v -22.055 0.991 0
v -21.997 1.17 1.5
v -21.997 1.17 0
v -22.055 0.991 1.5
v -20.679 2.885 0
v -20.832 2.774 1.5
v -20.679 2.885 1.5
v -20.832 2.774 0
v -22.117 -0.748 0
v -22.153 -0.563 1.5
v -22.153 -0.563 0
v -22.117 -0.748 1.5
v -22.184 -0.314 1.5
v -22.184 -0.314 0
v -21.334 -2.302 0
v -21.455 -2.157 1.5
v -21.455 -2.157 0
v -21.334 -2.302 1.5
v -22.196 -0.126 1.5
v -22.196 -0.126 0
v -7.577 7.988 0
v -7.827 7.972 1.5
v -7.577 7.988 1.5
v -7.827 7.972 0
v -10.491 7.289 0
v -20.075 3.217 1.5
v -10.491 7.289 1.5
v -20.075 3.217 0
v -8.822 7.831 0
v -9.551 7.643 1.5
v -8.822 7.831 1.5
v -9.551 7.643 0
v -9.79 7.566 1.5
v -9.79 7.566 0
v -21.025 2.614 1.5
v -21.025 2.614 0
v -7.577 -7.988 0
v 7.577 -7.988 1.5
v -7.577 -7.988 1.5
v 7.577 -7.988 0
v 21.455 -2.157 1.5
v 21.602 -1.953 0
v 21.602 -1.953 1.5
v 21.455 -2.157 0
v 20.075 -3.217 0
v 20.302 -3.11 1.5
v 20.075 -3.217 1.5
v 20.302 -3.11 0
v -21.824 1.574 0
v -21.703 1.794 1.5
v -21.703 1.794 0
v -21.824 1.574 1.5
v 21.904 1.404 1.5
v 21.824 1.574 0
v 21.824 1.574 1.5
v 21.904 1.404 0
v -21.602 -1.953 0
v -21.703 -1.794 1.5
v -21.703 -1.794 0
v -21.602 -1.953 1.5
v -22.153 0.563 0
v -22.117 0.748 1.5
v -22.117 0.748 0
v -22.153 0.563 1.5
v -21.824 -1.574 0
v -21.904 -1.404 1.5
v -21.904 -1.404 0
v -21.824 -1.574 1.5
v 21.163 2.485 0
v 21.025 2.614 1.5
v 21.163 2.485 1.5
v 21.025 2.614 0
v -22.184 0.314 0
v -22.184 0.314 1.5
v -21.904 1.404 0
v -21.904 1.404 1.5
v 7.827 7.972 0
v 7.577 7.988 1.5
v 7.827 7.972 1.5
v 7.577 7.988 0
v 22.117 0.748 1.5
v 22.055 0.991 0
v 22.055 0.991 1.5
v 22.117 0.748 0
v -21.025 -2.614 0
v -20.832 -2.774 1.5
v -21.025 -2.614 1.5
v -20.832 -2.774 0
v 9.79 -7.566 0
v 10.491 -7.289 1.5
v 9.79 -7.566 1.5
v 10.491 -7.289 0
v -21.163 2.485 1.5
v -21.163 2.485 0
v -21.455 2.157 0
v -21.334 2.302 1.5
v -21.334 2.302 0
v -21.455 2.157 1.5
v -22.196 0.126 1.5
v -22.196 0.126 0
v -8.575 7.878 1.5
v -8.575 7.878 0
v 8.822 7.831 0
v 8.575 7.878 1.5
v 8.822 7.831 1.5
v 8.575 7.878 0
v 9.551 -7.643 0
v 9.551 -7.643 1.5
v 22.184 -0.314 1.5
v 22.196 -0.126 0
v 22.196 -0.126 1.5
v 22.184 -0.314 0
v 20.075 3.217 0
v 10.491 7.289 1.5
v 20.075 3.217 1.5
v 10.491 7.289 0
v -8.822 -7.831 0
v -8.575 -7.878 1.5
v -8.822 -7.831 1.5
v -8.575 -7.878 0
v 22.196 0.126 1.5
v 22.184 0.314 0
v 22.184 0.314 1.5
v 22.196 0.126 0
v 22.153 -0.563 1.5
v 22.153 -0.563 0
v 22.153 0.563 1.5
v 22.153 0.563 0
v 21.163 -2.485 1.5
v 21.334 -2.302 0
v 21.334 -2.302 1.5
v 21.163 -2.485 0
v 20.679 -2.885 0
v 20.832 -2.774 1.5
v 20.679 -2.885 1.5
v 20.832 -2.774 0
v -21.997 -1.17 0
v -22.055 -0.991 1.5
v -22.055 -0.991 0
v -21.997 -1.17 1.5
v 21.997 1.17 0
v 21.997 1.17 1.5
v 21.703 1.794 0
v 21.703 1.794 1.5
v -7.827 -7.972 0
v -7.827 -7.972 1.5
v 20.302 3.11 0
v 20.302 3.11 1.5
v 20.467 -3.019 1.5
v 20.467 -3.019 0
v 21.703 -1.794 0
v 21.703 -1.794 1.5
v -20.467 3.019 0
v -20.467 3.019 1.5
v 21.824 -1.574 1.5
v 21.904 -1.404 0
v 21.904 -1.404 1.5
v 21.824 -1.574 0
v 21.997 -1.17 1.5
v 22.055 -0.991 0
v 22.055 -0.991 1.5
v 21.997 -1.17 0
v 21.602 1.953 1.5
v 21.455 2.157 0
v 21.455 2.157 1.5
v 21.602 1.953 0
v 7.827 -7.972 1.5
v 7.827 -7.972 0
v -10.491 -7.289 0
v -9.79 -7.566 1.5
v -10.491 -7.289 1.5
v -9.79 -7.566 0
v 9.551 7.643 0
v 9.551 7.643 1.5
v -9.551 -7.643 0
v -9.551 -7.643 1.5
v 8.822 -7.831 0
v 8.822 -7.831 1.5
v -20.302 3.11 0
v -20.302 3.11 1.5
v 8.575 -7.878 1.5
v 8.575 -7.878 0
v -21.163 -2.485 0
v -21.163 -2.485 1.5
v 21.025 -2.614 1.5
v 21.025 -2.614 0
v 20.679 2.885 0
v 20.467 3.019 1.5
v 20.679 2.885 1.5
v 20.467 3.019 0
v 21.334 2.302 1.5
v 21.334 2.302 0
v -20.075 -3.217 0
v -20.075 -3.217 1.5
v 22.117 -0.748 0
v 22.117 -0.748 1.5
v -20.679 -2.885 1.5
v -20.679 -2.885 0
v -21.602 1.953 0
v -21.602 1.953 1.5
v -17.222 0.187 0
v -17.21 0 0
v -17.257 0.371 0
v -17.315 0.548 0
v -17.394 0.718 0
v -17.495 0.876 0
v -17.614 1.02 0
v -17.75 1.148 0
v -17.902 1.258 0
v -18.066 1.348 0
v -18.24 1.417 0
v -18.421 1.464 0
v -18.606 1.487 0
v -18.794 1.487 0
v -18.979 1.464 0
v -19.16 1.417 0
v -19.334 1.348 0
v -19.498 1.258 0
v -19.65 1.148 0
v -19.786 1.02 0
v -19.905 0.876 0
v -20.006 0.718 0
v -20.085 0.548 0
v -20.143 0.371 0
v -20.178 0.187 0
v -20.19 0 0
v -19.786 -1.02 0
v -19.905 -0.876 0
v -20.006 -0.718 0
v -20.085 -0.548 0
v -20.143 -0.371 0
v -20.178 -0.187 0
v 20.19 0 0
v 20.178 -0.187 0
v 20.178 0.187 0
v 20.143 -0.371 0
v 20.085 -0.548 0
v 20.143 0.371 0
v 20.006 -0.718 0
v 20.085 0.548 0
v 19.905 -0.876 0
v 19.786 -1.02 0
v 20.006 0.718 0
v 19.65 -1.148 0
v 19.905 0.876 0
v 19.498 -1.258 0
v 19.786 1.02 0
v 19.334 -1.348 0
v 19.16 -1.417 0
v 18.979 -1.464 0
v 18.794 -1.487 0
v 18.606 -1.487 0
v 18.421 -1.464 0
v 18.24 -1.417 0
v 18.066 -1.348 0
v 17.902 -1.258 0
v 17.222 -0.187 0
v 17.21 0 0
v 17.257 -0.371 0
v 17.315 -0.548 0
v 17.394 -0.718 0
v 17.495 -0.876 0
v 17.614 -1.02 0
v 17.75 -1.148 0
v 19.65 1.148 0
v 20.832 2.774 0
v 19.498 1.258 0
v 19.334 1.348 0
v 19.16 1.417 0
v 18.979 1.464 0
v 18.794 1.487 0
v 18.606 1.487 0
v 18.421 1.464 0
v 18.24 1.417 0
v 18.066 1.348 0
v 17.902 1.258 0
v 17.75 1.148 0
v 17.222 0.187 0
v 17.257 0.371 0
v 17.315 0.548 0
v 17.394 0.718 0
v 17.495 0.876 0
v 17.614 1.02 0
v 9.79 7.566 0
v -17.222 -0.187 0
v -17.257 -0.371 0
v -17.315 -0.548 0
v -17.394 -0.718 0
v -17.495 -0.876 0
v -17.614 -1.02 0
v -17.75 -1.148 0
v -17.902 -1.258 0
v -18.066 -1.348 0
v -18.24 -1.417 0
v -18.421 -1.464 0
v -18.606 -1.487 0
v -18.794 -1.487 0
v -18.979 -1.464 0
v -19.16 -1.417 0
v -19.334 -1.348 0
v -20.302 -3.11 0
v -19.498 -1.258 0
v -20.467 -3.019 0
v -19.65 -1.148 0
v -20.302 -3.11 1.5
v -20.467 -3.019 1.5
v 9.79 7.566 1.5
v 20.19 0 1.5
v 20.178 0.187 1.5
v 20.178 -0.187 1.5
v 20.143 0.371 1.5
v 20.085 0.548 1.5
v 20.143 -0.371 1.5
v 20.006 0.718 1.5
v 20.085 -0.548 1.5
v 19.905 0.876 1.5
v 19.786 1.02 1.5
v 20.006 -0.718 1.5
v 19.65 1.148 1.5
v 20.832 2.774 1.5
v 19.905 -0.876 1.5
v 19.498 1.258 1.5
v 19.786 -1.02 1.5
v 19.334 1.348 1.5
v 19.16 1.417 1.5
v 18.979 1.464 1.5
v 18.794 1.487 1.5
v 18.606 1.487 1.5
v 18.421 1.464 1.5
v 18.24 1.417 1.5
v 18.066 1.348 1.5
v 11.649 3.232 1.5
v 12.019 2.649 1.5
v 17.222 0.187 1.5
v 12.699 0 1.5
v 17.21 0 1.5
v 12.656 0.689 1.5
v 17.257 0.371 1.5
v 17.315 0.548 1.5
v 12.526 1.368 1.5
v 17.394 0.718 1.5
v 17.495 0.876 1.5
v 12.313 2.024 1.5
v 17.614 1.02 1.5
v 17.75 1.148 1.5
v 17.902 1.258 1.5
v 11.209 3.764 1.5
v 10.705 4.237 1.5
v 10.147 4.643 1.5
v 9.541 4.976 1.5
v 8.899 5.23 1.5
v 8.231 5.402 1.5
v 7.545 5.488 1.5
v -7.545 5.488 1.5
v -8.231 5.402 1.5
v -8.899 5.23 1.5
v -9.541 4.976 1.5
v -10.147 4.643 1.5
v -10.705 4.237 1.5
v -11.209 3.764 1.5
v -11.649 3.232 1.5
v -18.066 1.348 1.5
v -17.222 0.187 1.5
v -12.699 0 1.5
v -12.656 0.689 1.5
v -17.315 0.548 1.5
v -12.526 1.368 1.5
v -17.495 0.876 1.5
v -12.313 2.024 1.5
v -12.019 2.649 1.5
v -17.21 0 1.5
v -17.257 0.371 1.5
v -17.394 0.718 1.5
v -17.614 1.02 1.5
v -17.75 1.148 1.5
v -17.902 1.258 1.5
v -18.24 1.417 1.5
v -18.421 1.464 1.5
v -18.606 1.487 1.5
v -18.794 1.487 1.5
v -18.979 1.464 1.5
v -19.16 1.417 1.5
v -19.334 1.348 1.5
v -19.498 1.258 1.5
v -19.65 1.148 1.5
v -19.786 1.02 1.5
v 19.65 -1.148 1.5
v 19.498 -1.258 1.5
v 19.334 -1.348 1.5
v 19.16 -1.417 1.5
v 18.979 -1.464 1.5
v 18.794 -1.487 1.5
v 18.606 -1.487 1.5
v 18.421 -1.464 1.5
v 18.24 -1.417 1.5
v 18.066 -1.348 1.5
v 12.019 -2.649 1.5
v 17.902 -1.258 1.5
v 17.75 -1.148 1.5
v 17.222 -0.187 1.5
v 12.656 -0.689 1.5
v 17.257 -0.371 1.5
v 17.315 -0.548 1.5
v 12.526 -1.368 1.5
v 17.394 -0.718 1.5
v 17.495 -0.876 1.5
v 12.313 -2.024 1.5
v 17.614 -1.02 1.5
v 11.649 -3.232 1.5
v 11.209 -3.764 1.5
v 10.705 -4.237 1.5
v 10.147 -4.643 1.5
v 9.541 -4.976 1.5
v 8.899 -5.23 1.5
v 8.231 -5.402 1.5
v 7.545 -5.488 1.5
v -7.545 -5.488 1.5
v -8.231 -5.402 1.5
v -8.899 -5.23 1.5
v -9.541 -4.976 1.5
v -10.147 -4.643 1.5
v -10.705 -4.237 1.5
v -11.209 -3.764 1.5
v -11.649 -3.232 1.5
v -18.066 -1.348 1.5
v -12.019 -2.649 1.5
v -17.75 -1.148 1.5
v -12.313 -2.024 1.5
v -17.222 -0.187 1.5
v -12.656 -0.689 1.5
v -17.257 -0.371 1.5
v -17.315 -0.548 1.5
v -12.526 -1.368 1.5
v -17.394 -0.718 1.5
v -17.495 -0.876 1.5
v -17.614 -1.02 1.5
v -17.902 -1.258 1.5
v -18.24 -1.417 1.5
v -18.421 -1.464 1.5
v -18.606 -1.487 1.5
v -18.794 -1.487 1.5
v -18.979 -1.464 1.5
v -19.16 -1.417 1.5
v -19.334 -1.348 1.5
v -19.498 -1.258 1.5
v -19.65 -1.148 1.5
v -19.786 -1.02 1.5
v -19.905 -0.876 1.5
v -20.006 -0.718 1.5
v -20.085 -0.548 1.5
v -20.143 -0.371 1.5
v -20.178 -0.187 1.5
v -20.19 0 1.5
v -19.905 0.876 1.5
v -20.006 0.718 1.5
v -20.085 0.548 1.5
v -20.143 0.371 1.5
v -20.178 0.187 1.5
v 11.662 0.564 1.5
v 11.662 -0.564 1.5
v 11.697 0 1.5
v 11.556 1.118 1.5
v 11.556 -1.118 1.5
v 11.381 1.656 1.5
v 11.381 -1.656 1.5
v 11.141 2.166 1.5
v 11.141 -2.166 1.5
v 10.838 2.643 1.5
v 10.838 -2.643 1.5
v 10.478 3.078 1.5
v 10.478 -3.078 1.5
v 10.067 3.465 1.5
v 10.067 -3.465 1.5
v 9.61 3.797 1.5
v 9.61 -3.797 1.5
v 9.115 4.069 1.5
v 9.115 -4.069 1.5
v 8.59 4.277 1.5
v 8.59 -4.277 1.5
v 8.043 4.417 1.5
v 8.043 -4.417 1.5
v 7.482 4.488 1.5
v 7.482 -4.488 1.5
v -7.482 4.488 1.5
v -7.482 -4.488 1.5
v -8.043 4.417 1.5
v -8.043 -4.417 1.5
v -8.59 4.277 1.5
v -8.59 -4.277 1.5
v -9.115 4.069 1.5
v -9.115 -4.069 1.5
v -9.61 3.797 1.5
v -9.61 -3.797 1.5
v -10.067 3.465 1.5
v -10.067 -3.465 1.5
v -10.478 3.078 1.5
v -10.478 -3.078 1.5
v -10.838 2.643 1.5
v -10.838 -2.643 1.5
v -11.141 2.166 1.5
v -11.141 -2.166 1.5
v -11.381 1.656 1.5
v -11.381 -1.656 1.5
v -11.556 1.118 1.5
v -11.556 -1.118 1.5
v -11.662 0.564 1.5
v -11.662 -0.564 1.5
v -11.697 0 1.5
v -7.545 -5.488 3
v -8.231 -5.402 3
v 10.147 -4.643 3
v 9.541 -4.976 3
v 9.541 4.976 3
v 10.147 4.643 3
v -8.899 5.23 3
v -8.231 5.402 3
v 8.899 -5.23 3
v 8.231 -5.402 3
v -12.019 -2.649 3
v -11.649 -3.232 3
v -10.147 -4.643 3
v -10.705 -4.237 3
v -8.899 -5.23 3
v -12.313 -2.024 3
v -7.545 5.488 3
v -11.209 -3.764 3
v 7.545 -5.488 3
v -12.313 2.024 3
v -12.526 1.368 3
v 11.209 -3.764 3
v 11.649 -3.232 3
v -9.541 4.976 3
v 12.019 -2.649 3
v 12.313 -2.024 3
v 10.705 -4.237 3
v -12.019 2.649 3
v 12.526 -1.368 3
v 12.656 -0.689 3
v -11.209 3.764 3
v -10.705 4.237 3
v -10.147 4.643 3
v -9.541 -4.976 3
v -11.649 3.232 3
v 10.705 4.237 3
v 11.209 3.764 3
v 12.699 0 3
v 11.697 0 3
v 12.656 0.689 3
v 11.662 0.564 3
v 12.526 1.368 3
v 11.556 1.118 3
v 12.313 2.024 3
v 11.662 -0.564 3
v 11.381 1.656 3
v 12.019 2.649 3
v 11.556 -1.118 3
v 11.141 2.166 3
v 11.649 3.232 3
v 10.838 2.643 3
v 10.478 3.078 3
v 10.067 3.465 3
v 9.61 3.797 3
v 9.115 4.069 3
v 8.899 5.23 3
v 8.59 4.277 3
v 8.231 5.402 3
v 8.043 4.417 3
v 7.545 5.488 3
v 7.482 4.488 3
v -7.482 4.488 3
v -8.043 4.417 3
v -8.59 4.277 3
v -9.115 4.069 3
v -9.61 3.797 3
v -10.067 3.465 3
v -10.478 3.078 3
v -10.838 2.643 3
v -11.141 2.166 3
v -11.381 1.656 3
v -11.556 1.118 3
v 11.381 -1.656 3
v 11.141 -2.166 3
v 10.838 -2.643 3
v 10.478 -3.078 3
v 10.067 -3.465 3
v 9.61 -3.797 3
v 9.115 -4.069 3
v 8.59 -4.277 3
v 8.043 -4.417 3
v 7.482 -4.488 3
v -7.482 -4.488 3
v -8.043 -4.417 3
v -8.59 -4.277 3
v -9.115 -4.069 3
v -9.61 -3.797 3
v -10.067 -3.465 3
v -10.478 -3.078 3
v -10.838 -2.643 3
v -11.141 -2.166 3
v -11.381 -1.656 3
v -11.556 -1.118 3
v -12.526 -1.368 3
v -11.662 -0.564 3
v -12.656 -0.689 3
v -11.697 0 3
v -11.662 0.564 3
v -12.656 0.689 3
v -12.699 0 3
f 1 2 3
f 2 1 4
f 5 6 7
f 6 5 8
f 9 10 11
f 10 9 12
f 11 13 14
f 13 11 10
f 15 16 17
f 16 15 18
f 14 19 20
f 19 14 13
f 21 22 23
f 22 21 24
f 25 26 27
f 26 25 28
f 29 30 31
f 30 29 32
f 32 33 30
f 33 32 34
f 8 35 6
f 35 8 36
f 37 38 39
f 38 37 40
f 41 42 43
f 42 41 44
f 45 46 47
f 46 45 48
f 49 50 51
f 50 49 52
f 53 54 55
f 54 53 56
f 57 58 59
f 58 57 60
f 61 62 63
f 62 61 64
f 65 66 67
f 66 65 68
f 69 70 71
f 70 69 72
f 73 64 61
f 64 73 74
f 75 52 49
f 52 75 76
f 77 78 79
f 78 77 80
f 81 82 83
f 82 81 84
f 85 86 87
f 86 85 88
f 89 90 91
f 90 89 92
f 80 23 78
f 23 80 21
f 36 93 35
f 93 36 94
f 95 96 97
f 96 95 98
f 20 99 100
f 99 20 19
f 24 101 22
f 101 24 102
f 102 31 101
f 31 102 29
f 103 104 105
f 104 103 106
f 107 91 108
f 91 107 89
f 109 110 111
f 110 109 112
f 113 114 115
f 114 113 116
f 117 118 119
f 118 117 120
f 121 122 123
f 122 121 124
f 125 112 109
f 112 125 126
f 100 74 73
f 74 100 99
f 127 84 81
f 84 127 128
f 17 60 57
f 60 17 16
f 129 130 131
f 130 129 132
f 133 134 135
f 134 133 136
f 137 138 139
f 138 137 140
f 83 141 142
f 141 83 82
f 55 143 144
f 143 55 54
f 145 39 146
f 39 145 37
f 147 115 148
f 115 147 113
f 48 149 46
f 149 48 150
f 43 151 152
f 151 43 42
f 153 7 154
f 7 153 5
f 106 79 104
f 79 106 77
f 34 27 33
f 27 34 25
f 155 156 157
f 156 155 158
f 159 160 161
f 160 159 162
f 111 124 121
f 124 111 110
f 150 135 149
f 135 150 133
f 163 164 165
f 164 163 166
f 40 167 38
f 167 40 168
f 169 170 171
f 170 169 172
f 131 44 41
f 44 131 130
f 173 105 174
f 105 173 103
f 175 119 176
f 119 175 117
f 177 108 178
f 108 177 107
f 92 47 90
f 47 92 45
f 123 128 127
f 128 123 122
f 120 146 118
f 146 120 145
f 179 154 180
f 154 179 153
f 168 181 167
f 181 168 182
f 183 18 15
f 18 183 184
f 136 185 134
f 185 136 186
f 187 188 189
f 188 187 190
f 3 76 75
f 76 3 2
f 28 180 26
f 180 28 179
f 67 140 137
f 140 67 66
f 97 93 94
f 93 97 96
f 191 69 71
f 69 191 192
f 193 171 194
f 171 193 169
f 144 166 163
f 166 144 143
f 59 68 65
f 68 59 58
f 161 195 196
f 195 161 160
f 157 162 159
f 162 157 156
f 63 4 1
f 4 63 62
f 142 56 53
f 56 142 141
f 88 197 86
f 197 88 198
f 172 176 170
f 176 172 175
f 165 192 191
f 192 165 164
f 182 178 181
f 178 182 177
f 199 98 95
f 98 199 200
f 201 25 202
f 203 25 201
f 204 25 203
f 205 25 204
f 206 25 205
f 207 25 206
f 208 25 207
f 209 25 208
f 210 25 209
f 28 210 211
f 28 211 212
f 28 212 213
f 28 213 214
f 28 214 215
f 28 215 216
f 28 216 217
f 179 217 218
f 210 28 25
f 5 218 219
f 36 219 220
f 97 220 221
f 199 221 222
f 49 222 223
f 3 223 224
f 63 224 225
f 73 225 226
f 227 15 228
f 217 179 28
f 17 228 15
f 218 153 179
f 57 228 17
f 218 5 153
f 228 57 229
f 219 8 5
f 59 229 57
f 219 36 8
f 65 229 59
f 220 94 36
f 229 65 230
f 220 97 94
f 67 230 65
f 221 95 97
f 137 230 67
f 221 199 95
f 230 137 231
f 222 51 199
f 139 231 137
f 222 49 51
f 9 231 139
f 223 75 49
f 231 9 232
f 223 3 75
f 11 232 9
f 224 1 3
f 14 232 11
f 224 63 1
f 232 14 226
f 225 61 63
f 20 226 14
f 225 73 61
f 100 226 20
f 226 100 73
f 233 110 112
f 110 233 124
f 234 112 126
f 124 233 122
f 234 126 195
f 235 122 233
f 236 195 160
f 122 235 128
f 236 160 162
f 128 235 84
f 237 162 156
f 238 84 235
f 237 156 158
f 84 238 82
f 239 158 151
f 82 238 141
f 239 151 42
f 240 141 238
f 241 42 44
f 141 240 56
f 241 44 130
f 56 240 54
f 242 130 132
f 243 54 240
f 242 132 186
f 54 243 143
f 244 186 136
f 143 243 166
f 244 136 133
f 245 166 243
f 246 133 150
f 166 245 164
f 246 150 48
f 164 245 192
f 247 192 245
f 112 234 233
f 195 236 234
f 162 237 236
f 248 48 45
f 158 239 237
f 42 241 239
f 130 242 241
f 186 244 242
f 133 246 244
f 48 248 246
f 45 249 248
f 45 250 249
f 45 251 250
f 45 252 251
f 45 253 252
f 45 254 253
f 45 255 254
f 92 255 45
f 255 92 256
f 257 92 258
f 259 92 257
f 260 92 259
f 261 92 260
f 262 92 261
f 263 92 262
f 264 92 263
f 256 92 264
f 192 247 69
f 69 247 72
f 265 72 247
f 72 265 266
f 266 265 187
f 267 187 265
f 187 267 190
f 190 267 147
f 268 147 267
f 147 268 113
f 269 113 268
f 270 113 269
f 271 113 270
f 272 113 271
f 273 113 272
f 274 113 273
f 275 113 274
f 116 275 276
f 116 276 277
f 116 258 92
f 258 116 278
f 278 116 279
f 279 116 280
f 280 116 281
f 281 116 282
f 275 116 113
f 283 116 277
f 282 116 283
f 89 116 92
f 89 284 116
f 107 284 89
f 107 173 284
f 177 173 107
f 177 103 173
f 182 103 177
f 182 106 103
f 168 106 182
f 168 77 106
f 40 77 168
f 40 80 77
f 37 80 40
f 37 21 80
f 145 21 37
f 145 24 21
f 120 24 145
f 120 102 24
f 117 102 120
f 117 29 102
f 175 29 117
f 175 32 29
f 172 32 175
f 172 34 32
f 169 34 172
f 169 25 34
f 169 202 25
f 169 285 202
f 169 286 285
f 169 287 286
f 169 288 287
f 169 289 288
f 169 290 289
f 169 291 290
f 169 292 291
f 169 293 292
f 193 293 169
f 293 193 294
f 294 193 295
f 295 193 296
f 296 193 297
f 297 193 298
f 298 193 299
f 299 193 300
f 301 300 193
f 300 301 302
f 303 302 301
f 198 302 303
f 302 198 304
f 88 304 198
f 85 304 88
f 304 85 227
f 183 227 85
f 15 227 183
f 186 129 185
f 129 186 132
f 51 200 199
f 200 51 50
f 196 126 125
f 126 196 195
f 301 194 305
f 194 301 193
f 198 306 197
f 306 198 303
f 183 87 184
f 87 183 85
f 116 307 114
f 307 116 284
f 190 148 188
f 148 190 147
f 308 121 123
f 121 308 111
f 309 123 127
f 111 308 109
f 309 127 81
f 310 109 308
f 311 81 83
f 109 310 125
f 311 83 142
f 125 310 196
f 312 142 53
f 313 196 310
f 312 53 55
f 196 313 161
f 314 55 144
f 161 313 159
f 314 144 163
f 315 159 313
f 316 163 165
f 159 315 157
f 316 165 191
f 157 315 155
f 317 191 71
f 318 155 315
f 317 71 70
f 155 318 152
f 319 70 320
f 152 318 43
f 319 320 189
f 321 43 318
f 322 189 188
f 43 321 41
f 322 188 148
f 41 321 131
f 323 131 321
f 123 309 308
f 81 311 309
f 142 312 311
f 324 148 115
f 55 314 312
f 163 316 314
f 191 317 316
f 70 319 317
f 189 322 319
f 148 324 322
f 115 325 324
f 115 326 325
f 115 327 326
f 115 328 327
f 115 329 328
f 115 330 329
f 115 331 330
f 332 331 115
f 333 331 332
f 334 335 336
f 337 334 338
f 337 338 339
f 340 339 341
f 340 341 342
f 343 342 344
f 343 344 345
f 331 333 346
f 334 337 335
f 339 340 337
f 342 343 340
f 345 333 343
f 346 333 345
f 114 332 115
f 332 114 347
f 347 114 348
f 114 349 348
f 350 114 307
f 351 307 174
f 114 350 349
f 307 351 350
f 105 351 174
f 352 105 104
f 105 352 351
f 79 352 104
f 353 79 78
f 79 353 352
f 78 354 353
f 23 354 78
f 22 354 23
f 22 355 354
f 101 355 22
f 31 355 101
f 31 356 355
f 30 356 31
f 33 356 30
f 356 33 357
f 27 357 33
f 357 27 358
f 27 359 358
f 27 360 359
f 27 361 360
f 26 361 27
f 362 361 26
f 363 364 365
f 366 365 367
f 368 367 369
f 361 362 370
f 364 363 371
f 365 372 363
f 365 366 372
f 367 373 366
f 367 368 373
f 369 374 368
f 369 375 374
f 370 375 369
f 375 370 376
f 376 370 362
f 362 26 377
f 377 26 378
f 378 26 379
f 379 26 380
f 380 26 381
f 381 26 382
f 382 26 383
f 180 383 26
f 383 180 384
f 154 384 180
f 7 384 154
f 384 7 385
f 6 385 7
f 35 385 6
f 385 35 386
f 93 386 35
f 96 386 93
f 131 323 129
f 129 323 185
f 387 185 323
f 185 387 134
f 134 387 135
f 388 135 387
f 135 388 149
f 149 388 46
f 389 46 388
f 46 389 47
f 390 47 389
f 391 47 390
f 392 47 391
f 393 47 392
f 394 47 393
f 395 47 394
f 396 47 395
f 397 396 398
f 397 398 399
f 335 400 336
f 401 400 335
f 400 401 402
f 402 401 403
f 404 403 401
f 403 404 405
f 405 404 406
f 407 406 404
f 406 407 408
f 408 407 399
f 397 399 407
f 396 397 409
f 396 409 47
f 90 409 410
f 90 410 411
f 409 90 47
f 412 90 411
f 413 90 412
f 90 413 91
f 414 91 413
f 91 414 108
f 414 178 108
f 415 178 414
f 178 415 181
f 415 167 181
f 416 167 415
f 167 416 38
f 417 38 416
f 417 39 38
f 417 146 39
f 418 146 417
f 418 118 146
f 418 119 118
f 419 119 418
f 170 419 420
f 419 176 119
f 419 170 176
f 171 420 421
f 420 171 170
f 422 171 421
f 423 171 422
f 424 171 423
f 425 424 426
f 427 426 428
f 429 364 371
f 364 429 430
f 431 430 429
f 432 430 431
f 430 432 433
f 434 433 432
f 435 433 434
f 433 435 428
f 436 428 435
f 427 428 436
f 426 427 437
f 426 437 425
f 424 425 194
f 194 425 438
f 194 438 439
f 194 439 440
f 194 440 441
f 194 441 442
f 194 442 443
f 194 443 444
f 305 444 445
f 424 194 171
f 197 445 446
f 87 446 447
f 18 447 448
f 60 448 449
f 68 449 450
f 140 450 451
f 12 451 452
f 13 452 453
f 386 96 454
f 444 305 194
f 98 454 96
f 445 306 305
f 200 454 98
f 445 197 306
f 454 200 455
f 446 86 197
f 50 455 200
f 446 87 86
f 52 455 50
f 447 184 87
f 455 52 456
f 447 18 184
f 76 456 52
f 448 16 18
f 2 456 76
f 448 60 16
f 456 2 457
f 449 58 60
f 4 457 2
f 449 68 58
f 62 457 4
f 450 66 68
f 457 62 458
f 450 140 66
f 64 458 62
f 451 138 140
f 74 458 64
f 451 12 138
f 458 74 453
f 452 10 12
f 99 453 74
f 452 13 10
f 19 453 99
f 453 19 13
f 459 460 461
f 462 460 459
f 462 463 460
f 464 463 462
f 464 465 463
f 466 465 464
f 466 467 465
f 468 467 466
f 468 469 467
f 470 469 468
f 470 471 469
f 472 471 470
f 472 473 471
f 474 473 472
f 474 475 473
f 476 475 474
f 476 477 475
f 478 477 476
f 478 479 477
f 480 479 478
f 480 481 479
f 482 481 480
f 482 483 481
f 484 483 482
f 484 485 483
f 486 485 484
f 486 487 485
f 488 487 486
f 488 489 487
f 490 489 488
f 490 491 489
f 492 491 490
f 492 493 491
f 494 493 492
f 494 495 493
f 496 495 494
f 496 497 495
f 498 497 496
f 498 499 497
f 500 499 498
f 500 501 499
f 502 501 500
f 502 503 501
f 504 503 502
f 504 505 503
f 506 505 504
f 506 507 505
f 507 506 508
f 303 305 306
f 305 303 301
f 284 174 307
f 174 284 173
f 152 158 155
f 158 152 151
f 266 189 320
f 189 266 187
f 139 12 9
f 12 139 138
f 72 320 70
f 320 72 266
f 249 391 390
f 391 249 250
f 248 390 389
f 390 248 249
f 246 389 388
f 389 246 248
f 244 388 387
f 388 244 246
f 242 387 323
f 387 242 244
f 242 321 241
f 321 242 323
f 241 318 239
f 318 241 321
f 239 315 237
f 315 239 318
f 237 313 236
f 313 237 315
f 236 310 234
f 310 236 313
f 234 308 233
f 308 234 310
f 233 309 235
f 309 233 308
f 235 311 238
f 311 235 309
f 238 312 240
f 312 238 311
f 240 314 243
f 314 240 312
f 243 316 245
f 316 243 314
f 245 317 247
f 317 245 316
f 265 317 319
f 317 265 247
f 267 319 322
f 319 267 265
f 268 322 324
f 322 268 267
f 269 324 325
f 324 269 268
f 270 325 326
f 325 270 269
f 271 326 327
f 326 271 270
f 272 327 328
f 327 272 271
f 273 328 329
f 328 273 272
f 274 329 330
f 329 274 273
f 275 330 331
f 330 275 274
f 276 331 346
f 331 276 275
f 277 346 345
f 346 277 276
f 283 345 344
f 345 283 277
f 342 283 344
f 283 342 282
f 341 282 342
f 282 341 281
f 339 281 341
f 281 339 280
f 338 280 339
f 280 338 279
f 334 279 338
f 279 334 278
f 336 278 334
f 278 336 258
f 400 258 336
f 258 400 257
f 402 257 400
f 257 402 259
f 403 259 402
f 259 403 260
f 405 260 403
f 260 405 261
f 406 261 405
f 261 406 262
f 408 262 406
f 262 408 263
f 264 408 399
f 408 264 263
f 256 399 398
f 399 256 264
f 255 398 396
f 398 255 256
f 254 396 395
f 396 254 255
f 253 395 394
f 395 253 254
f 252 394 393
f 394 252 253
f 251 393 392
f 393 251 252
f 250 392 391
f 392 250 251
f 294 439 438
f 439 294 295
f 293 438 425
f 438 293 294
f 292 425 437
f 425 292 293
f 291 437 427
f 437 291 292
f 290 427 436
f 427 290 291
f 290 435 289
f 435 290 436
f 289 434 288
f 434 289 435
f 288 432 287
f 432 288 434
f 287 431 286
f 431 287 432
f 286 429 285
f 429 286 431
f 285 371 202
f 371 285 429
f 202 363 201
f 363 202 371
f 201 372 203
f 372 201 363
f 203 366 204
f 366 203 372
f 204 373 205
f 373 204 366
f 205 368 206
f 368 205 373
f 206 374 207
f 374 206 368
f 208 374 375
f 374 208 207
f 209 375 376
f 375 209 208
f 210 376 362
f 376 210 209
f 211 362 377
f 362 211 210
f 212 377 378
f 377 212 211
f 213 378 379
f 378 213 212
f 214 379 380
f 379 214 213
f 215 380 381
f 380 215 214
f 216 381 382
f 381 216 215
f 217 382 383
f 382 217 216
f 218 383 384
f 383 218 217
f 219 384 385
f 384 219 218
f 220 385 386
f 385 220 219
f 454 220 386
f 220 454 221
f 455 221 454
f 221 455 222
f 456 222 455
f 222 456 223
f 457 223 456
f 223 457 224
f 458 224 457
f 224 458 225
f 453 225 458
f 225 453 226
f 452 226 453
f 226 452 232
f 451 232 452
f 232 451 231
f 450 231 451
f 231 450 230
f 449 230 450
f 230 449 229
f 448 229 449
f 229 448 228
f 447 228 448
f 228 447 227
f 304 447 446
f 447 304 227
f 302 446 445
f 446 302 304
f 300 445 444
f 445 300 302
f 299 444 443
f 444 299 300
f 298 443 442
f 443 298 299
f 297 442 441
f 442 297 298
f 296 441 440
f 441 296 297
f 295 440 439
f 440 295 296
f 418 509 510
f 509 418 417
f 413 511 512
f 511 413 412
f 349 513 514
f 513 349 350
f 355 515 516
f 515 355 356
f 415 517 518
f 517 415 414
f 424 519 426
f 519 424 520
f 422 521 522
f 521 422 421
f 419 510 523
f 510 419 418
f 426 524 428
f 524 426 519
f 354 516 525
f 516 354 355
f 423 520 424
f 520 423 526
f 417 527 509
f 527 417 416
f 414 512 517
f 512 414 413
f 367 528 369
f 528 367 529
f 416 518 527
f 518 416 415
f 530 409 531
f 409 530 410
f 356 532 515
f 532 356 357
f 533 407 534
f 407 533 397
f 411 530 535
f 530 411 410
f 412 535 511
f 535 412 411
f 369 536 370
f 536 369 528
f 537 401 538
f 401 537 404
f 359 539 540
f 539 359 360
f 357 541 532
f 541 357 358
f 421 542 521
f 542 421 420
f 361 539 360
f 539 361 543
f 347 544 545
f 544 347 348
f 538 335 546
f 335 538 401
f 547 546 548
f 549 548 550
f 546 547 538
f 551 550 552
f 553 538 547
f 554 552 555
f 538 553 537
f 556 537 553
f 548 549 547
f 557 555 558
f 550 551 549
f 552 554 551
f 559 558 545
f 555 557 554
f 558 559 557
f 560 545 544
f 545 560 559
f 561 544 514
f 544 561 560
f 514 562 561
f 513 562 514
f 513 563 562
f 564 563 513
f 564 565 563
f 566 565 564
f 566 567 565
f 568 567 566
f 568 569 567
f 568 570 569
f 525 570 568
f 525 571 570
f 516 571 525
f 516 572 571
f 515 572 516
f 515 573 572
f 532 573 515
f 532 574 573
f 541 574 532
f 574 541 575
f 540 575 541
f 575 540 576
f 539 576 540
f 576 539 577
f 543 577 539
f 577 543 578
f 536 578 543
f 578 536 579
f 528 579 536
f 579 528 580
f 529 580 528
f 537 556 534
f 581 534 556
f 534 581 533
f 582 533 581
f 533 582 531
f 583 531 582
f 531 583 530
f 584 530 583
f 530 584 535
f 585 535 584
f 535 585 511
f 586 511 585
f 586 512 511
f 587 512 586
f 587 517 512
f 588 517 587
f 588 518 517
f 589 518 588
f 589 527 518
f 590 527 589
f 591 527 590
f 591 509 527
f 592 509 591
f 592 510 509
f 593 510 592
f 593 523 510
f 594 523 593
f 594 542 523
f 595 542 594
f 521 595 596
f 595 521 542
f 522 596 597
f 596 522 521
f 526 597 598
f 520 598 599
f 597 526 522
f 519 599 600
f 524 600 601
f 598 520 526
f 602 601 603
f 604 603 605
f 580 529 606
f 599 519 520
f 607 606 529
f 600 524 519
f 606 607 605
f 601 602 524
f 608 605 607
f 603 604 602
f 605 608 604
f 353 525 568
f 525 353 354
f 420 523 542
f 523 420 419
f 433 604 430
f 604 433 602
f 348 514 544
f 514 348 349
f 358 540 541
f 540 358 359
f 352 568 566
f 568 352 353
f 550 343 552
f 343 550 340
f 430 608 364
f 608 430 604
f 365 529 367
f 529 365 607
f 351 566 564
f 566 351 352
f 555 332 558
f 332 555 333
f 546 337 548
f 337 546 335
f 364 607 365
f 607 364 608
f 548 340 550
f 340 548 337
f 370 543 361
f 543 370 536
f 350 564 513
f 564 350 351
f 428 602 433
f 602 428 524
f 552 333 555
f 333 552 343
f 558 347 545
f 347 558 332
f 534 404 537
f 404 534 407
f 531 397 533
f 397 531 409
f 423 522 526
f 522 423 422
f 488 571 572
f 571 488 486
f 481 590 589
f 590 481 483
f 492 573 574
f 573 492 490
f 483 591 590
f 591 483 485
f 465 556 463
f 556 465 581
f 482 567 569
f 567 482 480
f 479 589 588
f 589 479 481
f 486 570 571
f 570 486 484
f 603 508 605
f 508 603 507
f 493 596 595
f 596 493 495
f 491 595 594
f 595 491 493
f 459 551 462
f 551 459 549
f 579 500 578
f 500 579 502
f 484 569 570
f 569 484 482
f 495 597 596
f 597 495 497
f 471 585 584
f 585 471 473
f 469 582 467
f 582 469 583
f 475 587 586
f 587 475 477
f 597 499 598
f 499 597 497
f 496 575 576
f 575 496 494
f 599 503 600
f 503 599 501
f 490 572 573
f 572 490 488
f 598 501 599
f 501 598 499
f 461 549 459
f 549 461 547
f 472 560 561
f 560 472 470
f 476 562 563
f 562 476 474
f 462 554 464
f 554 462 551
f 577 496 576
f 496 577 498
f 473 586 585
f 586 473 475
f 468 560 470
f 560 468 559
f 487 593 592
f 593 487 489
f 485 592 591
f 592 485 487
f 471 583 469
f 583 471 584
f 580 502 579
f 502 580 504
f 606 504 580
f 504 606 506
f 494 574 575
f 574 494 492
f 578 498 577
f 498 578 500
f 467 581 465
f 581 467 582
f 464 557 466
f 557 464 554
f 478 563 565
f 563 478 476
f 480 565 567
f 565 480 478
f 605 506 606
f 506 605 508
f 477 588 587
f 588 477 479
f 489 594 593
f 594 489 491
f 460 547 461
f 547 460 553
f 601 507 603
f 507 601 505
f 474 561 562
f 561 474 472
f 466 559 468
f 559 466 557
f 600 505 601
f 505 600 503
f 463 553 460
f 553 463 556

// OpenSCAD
// file: common.scad
module __fillet(r) {
   offset(r = +r) {
     offset(delta = -r) {
       children();
     }
   }
}

module __chamfer_corners(r) {
    offset(r = +r) {
        offset(delta = -r) {
            children();
        }
    }
}

module __apply_border(size) {
    translate([size, size]) {
        offset(delta = size) {
            children();
        }
    }
}
// file: box.scad
include <config.scad>
include <common.scad>


module __box_outline(size) {
    size = size == undef ? box_size : size;
    __fillet(r=fillet_radius) {
         square([size.x, size.y]);
    }
}


module __bolt_holes_outline(d, size) {
    size = size == undef ? box_size : size;
    translate([screw_post_inset, screw_post_inset]) {
        circle(d = d);
    }
    translate([size.x - screw_post_inset, screw_post_inset]) {
        circle(d = d);
    }
    translate([size.x - screw_post_inset, size.y - screw_post_inset]) {
        circle(d = d);
    }
    translate([screw_post_inset, size.y - screw_post_inset]) {
        circle(d = d);
    }
}


module __vacuum_hole_outline() {
    spacing = vacuum_hole_diameter * 0.6;

    hull() {
        translate([-spacing, 0, 0]) {
            circle(d = vacuum_hole_diameter);
        }
        translate([spacing, 0, 0]) {
            circle(d = vacuum_hole_diameter);
        }
    }

    screw_spacing = spacing + vacuum_hole_diameter / 2 + bolt_head_clearance / 2 + 2;

    translate([screw_spacing, 0, 0]) {
        circle(d = bolt_diameter);
    }
    translate([-screw_spacing, 0, 0]) {
        circle(d = bolt_diameter);
    }
}

module __vacuum_hole() {
    translate([box_size.x / 2, 0, box_size.z / 2]) {
        rotate([90, 0, 0]) {
            linear_extrude(wall_thickness * 2 + 0.04, center=true) {
                __vacuum_hole_outline();
            }
        }
    }
}

module __vacuum_holes() {
    __vacuum_hole();
    translate([0, box_size.y]) __vacuum_hole();
    rotate([0, 0, 90]) __vacuum_hole();
    translate([box_size.x, 0]) rotate([0, 0, 90]) __vacuum_hole();
}

module box() {
    color("MediumPurple") {
        difference() {
            union() {
                difference() {
                    // Box
                    linear_extrude(box_size.z) {
                        __box_outline();
                    }
                    // Inner void
                    translate([0, 0, floor_thickness]) {
                        linear_extrude(box_size.z) {
                            offset(r = -wall_thickness) {
                                __box_outline();
                            }
                        }
                    }
                    // Vacuum holes
                    __vacuum_holes();
                }

                // Screw posts
                linear_extrude(box_size.z) {
                    __bolt_holes_outline(screw_post_diameter);
                }
            }

            // Screw holes
            translate([0, 0, -0.02]) {
                linear_extrude(box_size.z + 0.04) {
                    difference() {
                        __bolt_holes_outline(bolt_diameter);
                    }
                }
                linear_extrude(nut_height) {
                    difference() {
                        __bolt_holes_outline(nut_diameter);
                    }
                }
            }
        }
    }
}

box();
// file: config.scad
$fn = 50;

pcb_size = [130, 118, 1.6];
stencil_size = [220, 210];

box_size = [80, 80, 20];
lid_size = [240, 240];
fillet_radius = 10;
wall_thickness = 2;
floor_thickness = 1.5;
bolt_diameter = 3;
bolt_head_clearance = 7;
bolt_head_height = 2.7;
nut_diameter = 7;
nut_height = 4;
lid_thickness = 4;
lid_hole_spacing = 10;
lid_hole_diameter = 3.3;
lid_hole_border = 10;
magnet_size = [6.1, 2.1];
lift_hole_diameter = 20;
vacuum_hole_diameter = 12;
guide_hole_diameter = 4;
guide_peg_length = 15;

screw_post_diameter = bolt_head_clearance + 2;
screw_post_inset = 6.3;
// main file
include <config.scad>
use <box.scad>


module __vacuum_seal_slot(spacing) {
    hull() {
        translate([-spacing, 0, 0]) {
            circle(d = vacuum_hole_diameter);
        }
        translate([spacing, 0, 0]) {
            circle(d = vacuum_hole_diameter);
        }
    }
}


module vacuum_seal() {
    spacing = vacuum_hole_diameter * 0.6;
    screw_spacing = spacing + vacuum_hole_diameter / 2 + bolt_head_clearance / 2 + 2;

    
    difference() {
        linear_extrude(1.5) {
            hull() {
                offset(2) {
                    __vacuum_hole_outline();
                }
            }
        }
        
        translate([0, 0, -0.02]) {
            linear_extrude(3) {
                translate([screw_spacing, 0, 0]) {
                    circle(d = bolt_diameter - 0.02);
                }
                translate([-screw_spacing, 0, 0]) {
                    circle(d = bolt_diameter - 0.02);
                }
            }
        }
    }
    
    difference() {
        linear_extrude(3) {
            offset(-0.5) {
                __vacuum_seal_slot(spacing);
            }
        }
        linear_extrude(3 + 0.02) {
            offset(-1.5) {
                __vacuum_seal_slot(spacing);
            }
        }
    }
}

vacuum_seal();
